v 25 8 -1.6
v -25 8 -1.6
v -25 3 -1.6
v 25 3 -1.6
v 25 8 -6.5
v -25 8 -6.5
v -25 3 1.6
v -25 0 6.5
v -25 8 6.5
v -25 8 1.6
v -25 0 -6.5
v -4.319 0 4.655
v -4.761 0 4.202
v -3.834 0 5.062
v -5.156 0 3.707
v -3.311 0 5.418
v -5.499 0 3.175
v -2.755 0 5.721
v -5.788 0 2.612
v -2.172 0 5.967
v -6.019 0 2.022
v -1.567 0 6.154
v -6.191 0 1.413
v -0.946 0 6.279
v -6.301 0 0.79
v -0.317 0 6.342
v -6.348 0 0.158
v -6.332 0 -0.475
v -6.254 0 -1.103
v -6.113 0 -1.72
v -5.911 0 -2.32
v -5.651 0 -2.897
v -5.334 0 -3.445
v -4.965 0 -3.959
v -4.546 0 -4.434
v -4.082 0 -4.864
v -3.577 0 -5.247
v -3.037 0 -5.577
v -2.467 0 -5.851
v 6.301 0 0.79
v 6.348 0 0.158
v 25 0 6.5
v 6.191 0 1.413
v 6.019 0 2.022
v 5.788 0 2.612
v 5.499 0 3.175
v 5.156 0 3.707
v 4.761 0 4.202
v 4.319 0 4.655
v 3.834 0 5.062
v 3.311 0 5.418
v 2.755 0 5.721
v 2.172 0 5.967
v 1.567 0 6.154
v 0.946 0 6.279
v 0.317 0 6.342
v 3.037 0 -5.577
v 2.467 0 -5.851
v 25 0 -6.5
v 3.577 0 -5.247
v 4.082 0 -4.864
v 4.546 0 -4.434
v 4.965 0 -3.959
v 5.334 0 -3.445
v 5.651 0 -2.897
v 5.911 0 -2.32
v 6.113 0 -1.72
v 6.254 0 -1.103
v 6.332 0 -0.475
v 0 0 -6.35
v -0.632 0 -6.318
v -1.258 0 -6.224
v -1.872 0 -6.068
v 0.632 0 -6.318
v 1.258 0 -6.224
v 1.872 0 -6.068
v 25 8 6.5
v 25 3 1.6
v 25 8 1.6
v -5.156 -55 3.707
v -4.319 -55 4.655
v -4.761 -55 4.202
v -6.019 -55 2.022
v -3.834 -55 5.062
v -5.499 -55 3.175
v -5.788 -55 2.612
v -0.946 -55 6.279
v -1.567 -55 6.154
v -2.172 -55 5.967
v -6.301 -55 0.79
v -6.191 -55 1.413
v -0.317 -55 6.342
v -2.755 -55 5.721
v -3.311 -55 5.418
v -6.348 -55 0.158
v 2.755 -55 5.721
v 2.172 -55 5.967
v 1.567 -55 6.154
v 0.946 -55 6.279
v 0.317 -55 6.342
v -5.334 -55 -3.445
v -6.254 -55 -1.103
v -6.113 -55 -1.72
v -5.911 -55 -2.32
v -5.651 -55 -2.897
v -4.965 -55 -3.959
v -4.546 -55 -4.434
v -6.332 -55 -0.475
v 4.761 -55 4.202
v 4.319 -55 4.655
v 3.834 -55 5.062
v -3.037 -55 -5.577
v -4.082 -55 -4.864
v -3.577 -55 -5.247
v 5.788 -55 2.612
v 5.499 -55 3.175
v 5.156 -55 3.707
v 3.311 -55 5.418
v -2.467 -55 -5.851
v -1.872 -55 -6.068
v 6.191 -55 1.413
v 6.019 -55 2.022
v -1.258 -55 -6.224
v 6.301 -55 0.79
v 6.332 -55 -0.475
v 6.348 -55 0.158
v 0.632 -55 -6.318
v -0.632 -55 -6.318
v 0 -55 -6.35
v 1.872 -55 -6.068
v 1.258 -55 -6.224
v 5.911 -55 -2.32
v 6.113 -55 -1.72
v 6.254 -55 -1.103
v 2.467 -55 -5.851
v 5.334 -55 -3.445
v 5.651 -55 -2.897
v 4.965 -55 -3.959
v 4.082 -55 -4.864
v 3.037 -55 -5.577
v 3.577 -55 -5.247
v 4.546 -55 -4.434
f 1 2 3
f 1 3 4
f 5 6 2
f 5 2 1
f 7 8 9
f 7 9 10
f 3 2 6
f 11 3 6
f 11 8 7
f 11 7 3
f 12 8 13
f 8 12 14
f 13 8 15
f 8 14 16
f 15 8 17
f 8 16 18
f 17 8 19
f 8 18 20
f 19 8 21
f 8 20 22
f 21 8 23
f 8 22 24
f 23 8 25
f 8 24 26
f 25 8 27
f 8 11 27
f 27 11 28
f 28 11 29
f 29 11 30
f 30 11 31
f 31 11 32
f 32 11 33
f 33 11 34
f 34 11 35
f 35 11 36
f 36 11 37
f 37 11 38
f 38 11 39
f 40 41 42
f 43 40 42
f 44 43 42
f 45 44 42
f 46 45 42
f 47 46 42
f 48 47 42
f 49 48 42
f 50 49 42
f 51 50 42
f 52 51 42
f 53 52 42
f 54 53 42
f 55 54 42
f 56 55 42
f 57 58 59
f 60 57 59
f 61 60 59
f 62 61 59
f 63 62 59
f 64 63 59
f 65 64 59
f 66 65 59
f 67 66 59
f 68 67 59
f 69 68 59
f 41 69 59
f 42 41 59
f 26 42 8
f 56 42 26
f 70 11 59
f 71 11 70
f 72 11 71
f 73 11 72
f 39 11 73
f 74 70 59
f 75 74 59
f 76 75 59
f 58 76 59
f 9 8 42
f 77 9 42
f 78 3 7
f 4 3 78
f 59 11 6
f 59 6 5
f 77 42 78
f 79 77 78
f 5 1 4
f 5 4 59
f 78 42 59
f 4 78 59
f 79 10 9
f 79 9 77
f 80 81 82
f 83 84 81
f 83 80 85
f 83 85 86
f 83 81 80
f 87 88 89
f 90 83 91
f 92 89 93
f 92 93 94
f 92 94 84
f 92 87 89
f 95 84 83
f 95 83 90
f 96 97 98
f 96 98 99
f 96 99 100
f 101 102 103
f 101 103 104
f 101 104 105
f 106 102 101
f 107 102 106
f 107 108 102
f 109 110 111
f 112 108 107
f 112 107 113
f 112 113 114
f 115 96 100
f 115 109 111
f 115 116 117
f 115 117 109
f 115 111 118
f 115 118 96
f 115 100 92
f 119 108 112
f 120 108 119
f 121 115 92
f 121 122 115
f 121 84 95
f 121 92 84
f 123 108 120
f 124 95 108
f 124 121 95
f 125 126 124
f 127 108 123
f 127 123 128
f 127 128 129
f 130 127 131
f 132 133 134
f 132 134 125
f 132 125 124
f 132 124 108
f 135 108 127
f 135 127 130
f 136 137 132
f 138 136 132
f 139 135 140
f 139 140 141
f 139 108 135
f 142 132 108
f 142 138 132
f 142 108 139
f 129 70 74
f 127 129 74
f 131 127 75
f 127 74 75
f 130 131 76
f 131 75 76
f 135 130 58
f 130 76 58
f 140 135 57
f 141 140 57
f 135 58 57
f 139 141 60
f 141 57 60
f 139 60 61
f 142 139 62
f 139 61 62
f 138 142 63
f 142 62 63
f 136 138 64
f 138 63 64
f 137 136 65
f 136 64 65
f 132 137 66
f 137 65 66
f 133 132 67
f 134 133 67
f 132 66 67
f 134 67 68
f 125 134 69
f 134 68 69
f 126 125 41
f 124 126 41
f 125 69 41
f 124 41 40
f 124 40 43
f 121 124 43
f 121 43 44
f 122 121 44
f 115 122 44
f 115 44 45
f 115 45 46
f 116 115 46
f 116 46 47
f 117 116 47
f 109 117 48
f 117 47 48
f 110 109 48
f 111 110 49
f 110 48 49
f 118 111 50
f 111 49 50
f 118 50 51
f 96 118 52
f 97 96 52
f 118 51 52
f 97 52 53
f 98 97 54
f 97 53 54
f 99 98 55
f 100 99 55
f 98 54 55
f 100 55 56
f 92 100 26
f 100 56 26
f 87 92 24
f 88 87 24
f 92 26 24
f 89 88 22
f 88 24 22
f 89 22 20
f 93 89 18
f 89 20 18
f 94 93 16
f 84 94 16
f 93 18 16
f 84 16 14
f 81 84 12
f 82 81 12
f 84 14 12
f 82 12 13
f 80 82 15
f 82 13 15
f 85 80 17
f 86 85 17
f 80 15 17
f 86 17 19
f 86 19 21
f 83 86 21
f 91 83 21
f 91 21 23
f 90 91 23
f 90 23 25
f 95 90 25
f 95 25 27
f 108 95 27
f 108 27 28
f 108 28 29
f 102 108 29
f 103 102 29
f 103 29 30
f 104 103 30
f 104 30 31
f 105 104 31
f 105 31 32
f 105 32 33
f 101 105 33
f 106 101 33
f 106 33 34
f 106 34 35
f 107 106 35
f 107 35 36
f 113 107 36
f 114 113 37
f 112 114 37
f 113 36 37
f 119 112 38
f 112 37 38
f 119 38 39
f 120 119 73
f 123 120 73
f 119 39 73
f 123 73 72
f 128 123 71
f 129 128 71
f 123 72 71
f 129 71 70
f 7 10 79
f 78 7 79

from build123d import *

# Parameters (mm, degrees)
SKETCH_1_W          = 50
SKETCH_1_H          = 13
EXTRUDE_1_DEPTH     = 8
SKETCH_2_R          = 6.35
EXTRUDE_2_DEPTH     = 55
SKETCH_3_W          = 50
SKETCH_3_H          = 3.2
CUT_EXTRUDE_1_DEPTH = 5


with BuildPart() as part:
    # 草图1 → 凸台-拉伸1 (new body)
    with BuildSketch(Plane(origin=(0, 0, 0), x_dir=(1, 0, 0), z_dir=(0, 1, 0))):
        Rectangle(SKETCH_1_W, SKETCH_1_H)
    extrude(amount=EXTRUDE_1_DEPTH)

    # 草图2 → 凸台-拉伸2 (add)
    with BuildSketch(Plane.XZ):
        with Locations(Location((0, 0, 0), (0, 0, 270))):
            Circle(SKETCH_2_R)
    extrude(amount=EXTRUDE_2_DEPTH)

    # 草图3 → 切除-拉伸1 (cut)
    with BuildSketch(Plane(origin=(0, 8, 0), x_dir=(1, 0, 0), z_dir=(0, 1, 0))):
        Rectangle(SKETCH_3_W, SKETCH_3_H)
    extrude(amount=-CUT_EXTRUDE_1_DEPTH, mode=Mode.SUBTRACT)


solid = part.part
